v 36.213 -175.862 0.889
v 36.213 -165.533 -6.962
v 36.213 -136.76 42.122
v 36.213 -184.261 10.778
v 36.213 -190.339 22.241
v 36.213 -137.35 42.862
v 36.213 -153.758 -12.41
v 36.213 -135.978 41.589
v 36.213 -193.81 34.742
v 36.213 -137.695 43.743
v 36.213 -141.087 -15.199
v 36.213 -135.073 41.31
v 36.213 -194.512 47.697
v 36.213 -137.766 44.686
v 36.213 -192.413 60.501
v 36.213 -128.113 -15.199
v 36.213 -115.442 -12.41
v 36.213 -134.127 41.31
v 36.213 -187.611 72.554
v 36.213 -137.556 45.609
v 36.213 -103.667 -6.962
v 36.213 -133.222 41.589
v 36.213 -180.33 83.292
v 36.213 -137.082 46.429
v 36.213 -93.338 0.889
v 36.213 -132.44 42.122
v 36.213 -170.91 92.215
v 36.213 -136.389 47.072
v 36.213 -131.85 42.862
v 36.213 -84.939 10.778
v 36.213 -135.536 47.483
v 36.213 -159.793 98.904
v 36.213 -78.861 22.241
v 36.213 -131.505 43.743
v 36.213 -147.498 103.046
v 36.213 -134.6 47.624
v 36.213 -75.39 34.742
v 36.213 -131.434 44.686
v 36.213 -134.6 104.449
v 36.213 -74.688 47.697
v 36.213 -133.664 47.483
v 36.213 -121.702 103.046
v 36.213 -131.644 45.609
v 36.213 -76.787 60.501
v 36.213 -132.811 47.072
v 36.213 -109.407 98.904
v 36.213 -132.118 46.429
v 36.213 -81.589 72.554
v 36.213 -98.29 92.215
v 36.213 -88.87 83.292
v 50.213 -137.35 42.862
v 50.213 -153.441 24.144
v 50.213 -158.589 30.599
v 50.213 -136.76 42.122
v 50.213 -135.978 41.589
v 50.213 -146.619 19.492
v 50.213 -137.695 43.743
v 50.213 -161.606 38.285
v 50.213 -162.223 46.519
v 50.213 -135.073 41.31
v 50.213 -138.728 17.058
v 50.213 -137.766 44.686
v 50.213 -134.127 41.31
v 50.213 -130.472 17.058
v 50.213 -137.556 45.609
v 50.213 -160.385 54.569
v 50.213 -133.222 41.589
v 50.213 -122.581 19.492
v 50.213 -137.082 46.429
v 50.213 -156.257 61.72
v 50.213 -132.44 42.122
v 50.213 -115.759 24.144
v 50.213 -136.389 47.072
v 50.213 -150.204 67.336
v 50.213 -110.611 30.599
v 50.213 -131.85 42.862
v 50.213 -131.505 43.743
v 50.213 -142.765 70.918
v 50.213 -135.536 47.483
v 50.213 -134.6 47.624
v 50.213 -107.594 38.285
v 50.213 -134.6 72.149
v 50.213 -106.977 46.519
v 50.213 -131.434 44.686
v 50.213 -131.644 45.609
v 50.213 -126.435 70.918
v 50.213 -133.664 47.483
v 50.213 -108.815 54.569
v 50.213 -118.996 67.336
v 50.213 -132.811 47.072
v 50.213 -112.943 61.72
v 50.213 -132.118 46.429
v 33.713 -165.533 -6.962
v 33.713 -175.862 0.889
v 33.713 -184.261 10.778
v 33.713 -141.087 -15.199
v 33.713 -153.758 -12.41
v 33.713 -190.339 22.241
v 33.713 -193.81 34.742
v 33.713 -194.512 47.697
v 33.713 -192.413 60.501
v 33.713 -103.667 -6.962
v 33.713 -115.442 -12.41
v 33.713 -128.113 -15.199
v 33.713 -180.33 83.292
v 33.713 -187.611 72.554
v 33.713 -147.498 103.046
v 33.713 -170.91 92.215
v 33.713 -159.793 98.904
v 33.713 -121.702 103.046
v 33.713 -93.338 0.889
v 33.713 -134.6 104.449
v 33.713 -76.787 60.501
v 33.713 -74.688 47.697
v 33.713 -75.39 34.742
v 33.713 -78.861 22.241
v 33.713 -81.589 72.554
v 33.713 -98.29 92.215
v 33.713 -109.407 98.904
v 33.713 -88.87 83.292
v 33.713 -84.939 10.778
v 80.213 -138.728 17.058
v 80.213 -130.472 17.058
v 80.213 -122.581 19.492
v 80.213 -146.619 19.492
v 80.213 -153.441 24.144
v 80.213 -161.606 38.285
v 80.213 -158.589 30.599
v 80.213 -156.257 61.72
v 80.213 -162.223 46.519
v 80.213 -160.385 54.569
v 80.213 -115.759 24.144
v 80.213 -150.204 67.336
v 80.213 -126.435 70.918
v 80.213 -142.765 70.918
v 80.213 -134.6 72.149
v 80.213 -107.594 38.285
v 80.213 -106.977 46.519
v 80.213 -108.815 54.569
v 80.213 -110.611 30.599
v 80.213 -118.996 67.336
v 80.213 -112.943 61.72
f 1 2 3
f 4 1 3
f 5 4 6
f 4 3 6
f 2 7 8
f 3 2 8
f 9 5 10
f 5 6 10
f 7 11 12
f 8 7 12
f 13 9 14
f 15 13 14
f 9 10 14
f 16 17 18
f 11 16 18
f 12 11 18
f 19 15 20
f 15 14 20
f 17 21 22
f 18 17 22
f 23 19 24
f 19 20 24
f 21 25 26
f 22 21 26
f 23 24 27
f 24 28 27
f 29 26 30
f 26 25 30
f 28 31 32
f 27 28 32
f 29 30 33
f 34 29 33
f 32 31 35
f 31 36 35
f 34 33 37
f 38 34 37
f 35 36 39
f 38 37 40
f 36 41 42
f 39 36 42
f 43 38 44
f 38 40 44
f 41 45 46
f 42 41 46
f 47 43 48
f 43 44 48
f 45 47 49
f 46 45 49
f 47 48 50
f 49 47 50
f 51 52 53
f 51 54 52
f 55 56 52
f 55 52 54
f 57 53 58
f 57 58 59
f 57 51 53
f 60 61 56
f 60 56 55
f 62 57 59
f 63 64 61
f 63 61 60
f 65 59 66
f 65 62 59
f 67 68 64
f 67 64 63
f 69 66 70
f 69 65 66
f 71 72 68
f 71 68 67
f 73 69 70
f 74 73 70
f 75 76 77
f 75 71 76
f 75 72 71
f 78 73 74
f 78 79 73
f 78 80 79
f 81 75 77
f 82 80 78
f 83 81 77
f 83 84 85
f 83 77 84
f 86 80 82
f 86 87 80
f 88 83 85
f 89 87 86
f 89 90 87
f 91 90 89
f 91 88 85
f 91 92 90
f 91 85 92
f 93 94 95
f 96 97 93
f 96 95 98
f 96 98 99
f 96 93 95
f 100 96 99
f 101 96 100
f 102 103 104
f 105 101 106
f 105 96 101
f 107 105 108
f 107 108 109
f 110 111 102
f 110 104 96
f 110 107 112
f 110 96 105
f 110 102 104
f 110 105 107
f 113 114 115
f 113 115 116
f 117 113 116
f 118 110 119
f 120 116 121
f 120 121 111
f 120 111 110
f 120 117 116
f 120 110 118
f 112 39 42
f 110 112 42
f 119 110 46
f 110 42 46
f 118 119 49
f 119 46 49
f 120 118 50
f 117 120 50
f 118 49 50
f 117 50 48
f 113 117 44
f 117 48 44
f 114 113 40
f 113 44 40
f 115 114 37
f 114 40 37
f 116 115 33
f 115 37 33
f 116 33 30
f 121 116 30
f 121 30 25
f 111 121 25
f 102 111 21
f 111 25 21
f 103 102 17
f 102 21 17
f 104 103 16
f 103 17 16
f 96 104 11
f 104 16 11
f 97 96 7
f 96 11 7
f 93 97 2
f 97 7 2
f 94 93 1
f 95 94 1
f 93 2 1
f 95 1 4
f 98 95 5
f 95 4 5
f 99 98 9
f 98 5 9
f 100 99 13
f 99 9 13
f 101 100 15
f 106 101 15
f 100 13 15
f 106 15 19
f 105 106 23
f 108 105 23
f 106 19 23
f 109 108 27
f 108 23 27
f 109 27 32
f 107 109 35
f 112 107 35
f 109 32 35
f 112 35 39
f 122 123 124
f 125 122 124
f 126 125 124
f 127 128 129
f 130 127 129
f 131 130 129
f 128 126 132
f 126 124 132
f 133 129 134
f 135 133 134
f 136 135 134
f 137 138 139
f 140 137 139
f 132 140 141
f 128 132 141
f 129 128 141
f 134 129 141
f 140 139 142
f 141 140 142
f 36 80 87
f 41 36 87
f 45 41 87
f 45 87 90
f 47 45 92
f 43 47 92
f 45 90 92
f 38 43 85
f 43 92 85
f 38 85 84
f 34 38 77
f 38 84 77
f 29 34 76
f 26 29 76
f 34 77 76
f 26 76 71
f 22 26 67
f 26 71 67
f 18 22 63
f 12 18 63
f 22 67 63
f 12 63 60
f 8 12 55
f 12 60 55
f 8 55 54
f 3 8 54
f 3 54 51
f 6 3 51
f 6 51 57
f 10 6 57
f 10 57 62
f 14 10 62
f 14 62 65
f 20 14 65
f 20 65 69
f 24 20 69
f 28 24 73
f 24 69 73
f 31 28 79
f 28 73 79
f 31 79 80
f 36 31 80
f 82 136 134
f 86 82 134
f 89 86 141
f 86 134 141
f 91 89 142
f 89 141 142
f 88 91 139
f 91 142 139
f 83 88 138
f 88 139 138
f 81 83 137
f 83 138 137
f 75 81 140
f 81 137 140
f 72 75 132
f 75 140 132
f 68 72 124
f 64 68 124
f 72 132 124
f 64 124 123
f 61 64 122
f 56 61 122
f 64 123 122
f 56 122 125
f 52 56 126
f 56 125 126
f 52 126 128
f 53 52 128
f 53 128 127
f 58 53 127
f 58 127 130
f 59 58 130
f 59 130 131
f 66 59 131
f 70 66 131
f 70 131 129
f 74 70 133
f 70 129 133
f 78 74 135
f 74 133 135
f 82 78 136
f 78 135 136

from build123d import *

# Parameters (mm, degrees)
CYLINDER001_R             = 3.175
CYLINDER001_DEPTH         = 14
CYLINDER_R                = 27.7
CYLINDER_DEPTH            = 30
FUSION001_PLACEMENT_ANGLE = 90
CYLINDER003_R             = 60
CYLINDER003_DEPTH         = 2.5


with BuildPart() as cylinder:
    # Cylinder001 → Cylinder001 (new body)
    with BuildSketch(Plane.XY.offset(30)):
        Circle(CYLINDER001_R)
    extrude(amount=CYLINDER001_DEPTH)


with BuildPart() as motor:
    # Cylinder → Cylinder (new body)
    with BuildSketch(Plane.XY):
        Circle(CYLINDER_R)
    extrude(amount=CYLINDER_DEPTH)

    # Fusion001: union Cylinder
    add(cylinder.part)


with BuildPart() as motor_1:
    # Fusion001 placement: moved
    add(motor.part.moved(Location((88.412596, -158.1, 45.549103))).rotate(Axis((88.412596, -158.1, 45.549103), (0, -1, 0)), FUSION001_PLACEMENT_ANGLE))


with BuildPart() as motor_with_prop:
    # Cylinder003 → Cylinder003 (new body)
    with BuildSketch(Plane(origin=(44.412596, -158.1, 45.549103), x_dir=(0, 0, 1), z_dir=(-1, 0, 0))):
        Circle(CYLINDER003_R)
    extrude(amount=CYLINDER003_DEPTH)

    # Fusion005: union motor
    add(motor_1.part)


with BuildPart() as motor_with_prop_1:
    # Fusion005 placement: moved
    add(motor_with_prop.part.moved(Location((-8.2, 23.5, -1.1))))


solid = motor_with_prop_1.part
